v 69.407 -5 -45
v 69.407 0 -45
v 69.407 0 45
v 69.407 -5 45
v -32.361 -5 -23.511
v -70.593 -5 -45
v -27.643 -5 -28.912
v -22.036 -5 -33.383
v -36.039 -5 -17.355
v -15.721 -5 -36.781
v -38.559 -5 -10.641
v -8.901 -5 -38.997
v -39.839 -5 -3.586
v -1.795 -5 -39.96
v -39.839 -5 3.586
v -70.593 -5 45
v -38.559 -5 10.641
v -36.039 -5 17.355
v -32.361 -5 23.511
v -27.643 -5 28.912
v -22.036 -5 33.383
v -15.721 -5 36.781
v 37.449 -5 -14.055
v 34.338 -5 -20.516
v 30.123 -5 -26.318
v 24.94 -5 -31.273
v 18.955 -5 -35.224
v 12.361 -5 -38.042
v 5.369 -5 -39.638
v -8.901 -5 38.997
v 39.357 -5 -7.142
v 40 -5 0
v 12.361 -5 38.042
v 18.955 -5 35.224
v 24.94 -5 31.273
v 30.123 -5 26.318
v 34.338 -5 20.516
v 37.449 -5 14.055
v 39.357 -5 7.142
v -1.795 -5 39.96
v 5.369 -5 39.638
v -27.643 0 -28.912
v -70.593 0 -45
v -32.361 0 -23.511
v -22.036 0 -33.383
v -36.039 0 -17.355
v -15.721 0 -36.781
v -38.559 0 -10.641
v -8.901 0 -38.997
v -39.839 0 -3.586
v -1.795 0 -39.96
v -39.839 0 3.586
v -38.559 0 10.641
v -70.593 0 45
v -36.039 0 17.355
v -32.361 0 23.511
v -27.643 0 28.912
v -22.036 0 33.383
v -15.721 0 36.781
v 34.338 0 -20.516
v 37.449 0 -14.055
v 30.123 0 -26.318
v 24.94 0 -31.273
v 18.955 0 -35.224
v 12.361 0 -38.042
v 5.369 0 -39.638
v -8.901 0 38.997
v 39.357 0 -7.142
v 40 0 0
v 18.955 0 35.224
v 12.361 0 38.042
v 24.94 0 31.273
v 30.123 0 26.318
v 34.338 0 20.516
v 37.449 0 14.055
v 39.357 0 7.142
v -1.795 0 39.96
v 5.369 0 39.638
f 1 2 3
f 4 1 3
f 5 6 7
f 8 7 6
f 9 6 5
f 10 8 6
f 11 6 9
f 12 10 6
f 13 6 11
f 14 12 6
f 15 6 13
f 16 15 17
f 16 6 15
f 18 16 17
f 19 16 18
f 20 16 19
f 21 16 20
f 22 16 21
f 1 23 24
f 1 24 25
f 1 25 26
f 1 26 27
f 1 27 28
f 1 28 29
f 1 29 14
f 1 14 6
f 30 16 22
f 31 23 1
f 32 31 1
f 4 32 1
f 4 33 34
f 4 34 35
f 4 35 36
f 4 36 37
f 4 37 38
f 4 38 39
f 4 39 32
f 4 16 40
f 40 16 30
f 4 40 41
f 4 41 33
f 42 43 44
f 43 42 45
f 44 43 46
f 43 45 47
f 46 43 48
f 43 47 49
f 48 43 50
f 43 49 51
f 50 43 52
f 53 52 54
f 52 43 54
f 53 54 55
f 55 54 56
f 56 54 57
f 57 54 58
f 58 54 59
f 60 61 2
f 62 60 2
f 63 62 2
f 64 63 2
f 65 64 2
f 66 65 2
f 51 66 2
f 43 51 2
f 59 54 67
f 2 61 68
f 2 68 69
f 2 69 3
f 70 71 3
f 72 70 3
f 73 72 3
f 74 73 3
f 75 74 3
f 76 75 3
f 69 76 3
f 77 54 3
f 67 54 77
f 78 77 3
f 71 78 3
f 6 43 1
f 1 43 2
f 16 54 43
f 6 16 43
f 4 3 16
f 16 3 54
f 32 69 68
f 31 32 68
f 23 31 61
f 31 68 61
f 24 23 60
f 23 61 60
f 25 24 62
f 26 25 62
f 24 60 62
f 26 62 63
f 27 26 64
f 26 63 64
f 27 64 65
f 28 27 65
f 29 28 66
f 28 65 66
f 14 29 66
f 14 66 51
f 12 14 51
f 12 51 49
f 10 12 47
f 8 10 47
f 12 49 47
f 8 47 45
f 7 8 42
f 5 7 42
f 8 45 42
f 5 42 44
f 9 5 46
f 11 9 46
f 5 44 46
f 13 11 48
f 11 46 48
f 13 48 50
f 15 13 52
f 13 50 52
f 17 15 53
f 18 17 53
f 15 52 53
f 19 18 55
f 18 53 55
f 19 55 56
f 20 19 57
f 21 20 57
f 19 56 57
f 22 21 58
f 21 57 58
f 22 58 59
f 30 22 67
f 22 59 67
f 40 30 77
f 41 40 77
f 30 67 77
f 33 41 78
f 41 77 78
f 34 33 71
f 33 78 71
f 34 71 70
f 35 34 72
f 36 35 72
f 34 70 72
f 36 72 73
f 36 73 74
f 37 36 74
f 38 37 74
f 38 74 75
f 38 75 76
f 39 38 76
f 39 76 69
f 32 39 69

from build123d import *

# Parameters (mm, degrees)
F1_DEPTH = 5


with BuildPart() as f1:
    # F0 (on Front) → F1 (new body)
    with BuildSketch(Plane.XZ):
        Polygon((69.406778, -45), (69.406778, 0), (69.406778, 45), (-70.593222, 45), (-70.593222, -45), align=None)
        with BuildLine():
            ThreePointArc((-40, 0), (0, 40), (40, 0))
            ThreePointArc((40, 0), (0, -40), (-40, 0))
        make_face(mode=Mode.SUBTRACT)
    extrude(amount=F1_DEPTH)


solid = f1.part
